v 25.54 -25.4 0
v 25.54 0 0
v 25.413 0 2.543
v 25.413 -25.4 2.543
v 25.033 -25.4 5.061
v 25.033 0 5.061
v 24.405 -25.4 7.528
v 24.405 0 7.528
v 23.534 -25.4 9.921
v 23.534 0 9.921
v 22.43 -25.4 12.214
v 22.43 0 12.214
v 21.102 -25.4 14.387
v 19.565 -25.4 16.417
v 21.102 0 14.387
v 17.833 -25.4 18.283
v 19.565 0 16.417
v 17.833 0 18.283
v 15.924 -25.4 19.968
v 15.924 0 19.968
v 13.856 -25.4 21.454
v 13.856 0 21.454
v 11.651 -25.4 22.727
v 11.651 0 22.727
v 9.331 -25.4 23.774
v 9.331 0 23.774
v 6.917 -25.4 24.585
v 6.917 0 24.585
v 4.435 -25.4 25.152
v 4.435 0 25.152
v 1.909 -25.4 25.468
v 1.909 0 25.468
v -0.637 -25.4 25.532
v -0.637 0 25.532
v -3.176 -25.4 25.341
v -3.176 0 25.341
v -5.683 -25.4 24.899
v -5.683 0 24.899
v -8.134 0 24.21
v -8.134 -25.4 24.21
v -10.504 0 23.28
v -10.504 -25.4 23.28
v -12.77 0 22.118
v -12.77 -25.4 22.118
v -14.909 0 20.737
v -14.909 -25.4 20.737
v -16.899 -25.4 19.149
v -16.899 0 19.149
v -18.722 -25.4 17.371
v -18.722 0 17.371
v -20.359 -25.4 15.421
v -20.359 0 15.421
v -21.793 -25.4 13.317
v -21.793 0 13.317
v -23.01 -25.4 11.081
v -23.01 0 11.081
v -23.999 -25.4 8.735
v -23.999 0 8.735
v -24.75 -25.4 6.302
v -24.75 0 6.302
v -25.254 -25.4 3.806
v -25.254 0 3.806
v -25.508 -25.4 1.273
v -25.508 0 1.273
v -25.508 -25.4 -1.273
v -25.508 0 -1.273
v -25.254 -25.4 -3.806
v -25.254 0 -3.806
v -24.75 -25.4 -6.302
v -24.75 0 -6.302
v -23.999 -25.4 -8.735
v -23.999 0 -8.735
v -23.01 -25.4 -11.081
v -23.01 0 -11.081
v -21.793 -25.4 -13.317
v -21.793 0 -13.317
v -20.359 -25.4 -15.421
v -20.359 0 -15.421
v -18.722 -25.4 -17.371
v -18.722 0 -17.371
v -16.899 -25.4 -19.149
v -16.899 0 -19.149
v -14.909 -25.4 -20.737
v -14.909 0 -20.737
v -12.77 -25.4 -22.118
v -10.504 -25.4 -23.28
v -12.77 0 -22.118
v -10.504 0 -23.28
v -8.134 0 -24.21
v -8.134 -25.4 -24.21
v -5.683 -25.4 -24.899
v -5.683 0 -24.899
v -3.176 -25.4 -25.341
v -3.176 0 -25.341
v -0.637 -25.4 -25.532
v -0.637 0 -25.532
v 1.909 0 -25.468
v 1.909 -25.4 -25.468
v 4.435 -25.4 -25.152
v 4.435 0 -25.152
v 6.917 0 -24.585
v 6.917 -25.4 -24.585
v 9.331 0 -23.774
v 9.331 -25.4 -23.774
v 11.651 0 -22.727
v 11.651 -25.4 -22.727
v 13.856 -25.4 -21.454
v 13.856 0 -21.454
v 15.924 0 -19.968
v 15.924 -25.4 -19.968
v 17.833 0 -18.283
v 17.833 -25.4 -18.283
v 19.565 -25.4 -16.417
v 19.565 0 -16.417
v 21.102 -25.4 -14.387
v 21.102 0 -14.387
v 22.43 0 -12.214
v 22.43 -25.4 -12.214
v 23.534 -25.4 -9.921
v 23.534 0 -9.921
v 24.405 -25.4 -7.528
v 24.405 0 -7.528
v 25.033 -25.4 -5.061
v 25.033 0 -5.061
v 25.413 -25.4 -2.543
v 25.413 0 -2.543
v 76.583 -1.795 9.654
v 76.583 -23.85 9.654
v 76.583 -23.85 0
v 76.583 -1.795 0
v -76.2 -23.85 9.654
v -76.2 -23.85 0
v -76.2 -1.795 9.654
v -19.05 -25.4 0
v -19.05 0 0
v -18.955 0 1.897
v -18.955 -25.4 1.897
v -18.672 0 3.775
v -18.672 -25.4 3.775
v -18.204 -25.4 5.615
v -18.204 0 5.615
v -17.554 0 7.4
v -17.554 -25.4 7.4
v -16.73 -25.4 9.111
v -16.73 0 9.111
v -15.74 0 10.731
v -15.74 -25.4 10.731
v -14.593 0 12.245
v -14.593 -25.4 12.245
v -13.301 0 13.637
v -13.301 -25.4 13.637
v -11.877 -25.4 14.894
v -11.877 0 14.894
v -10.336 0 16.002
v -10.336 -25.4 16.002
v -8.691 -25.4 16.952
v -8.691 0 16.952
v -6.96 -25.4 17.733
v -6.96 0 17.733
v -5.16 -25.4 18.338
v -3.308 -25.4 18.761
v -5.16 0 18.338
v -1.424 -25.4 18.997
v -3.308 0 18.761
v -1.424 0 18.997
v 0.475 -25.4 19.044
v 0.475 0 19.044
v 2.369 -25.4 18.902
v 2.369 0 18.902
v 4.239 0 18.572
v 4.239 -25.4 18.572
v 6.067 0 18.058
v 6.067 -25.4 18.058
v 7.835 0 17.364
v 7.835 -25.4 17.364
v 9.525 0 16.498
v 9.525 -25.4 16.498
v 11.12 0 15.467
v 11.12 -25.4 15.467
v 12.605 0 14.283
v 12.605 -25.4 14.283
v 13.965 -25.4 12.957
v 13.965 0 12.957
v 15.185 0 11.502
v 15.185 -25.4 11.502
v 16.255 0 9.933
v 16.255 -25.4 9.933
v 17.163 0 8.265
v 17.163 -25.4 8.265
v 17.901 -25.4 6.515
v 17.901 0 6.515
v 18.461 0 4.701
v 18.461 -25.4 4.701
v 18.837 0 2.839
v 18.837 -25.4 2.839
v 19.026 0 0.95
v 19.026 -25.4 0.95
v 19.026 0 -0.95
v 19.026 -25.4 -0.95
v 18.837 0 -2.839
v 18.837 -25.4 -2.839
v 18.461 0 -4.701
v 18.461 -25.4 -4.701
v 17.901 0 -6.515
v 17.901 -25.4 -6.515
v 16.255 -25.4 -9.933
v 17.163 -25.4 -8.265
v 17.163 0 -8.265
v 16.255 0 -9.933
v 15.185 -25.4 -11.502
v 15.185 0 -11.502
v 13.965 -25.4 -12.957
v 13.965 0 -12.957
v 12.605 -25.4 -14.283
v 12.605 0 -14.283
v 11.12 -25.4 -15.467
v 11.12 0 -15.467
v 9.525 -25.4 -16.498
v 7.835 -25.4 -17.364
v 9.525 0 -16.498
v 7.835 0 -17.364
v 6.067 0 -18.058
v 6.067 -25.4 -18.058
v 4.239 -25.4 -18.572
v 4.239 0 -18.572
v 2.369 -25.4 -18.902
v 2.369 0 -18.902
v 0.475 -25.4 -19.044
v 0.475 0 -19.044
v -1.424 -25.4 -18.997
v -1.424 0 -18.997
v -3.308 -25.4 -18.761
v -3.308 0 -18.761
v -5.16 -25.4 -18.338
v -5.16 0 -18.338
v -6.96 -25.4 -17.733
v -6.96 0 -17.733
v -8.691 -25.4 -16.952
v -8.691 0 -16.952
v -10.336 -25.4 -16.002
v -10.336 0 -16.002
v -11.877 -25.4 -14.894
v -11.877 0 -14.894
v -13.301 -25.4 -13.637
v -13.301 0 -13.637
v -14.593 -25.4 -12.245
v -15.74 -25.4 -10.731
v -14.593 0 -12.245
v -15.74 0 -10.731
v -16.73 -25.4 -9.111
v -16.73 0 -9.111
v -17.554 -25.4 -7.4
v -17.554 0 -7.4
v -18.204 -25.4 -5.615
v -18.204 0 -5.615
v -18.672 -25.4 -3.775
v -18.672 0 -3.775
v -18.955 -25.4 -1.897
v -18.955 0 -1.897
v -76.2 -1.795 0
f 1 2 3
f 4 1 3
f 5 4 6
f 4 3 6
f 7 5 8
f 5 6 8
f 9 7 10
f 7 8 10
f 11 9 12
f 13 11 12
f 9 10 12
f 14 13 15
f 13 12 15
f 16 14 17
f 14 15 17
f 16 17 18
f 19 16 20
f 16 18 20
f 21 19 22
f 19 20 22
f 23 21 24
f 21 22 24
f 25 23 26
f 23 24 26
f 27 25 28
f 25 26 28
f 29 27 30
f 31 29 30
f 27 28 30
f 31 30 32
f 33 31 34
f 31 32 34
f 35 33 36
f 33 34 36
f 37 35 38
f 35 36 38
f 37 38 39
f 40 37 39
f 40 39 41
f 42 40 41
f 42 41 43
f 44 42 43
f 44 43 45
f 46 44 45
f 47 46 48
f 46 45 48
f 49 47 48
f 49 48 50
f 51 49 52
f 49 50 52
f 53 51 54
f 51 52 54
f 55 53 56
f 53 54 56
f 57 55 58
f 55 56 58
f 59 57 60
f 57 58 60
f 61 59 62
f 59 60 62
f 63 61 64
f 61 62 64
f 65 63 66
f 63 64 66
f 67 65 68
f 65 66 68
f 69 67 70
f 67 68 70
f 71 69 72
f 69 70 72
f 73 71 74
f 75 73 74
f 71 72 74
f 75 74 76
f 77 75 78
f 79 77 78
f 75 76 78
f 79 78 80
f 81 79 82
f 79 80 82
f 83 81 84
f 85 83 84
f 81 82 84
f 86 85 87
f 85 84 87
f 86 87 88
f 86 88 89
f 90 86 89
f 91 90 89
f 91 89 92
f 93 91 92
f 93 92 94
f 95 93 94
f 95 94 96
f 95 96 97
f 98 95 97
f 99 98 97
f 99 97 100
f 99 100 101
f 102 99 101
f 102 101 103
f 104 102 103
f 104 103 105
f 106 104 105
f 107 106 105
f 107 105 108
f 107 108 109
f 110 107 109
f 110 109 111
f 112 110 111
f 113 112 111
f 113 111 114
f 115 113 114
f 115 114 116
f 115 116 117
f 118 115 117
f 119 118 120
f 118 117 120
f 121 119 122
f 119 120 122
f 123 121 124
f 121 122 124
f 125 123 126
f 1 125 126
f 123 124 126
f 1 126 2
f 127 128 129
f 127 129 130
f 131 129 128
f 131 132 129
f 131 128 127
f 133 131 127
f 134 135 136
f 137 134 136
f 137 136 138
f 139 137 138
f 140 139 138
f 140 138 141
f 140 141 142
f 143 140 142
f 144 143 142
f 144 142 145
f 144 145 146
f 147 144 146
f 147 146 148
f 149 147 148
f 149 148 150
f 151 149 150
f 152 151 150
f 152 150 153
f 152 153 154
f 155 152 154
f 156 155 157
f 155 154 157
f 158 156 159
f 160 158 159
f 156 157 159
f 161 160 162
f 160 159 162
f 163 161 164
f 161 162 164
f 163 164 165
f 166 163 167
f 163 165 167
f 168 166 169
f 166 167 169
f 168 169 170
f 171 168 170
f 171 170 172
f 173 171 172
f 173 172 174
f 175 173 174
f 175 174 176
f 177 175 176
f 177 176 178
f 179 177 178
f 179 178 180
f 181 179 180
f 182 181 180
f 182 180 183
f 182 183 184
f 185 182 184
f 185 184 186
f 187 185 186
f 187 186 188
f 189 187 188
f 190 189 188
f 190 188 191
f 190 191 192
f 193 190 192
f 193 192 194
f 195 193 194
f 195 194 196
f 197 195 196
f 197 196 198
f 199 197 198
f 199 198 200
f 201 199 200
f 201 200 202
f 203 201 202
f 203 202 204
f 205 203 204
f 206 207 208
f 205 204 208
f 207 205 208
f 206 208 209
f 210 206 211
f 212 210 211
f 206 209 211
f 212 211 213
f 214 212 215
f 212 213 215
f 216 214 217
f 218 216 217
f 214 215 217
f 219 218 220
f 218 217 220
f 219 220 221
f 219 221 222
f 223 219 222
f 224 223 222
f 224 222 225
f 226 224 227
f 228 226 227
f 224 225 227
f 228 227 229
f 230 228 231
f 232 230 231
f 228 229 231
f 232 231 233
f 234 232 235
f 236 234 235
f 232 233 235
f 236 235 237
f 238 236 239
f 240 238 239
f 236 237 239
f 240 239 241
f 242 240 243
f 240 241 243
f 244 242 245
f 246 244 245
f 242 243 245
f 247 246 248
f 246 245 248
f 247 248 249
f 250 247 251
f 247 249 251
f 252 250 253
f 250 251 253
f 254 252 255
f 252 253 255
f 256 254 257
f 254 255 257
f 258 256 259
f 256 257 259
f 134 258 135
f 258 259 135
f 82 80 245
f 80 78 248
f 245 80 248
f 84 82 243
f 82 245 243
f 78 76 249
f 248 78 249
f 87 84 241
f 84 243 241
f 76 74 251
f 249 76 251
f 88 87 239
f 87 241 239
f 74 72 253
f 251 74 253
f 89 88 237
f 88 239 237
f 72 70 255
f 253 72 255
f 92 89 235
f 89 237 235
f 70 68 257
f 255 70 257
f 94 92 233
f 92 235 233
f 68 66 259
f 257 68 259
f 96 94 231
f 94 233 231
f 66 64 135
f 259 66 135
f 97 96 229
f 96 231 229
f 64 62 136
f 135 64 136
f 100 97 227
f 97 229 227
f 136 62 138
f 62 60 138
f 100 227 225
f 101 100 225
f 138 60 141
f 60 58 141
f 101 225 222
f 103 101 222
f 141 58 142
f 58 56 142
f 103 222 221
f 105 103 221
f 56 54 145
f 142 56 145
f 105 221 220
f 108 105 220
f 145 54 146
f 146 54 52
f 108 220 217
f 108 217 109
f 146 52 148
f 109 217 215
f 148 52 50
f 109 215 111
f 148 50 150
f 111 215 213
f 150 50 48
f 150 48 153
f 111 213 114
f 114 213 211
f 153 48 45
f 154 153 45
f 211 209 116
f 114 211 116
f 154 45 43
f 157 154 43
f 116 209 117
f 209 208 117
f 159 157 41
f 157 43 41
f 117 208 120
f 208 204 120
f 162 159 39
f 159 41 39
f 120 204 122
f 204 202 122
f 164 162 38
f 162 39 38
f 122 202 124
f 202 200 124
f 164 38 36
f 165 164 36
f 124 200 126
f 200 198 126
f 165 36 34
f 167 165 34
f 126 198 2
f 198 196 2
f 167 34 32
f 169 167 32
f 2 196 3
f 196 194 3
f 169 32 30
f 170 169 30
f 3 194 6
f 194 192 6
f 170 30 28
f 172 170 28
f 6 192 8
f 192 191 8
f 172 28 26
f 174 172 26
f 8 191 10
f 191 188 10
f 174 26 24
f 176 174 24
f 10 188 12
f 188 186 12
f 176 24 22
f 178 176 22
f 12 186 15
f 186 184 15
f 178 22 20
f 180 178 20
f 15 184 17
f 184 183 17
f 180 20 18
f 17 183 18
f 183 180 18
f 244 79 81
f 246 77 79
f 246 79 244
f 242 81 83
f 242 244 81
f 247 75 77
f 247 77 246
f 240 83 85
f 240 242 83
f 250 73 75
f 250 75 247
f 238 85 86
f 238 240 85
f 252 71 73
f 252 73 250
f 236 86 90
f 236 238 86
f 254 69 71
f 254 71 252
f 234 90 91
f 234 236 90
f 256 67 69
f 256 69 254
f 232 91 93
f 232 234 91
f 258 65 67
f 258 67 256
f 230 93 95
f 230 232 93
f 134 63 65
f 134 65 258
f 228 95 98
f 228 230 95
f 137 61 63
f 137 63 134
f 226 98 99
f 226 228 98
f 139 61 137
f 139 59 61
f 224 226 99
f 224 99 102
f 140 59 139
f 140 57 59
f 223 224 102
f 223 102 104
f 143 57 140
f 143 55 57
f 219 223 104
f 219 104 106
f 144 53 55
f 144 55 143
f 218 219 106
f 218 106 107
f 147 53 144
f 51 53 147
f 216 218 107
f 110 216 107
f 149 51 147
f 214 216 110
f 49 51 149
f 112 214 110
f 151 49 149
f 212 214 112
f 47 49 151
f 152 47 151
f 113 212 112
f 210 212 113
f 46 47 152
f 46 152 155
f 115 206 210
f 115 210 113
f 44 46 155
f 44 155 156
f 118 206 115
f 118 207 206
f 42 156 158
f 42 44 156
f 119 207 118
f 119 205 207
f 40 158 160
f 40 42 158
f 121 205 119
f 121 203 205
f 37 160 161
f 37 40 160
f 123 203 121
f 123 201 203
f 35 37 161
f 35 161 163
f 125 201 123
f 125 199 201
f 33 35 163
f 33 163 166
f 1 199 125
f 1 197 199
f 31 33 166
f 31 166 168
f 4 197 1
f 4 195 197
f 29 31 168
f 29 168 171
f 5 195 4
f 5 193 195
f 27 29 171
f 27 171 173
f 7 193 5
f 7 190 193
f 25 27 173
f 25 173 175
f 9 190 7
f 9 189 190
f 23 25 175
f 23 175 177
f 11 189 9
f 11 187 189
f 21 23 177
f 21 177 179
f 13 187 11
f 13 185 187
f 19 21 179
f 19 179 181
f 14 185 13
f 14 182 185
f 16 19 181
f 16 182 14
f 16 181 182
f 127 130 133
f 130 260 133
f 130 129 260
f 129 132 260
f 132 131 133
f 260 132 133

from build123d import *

# Parameters (mm, degrees)
F0_R          = 25.5397
F1_DEPTH      = 25.4
F3_D          = 38.1
F4_W          = 22.0553190447
F4_H          = 9.6537293866
F5_DEPTH      = 25.5407
F5_DEPTH_BACK = 76.2


# Not quite as in the source:
# - a pattern or mirror of a feature is missing from the dataset's text; its kind, count and spacing are read off the source's solid


with BuildPart() as f1:
    # F0 (on Front) → F1 (new body)
    with BuildSketch(Plane.XZ):
        Circle(F0_R)
    extrude(amount=F1_DEPTH)

    # F3 (through all)
    with Locations(Plane.XZ.offset(25.4)):
        with Locations((0, 0)):
            Hole(F3_D / 2)


with BuildPart() as f5:
    # F4 (on Right) → F5 (new body, two sides)
    with BuildSketch(Plane.YZ) as f5_sk:
        with Locations((-12.8223716747, 4.8268646933)):
            Rectangle(F4_W, F4_H)
    extrude(amount=F5_DEPTH)
    extrude(f5_sk.sketch, amount=-F5_DEPTH_BACK)

    # F5_copies: F5 across plane


with BuildPart() as f5_1:
    add(f5.part)
    add(f5.part.mirror(Plane(origin=(0.191323, 0, 0), x_dir=(0, 0, 1), z_dir=(1, 0, 0))))


solid = Compound([f1.part, f5_1.part])
